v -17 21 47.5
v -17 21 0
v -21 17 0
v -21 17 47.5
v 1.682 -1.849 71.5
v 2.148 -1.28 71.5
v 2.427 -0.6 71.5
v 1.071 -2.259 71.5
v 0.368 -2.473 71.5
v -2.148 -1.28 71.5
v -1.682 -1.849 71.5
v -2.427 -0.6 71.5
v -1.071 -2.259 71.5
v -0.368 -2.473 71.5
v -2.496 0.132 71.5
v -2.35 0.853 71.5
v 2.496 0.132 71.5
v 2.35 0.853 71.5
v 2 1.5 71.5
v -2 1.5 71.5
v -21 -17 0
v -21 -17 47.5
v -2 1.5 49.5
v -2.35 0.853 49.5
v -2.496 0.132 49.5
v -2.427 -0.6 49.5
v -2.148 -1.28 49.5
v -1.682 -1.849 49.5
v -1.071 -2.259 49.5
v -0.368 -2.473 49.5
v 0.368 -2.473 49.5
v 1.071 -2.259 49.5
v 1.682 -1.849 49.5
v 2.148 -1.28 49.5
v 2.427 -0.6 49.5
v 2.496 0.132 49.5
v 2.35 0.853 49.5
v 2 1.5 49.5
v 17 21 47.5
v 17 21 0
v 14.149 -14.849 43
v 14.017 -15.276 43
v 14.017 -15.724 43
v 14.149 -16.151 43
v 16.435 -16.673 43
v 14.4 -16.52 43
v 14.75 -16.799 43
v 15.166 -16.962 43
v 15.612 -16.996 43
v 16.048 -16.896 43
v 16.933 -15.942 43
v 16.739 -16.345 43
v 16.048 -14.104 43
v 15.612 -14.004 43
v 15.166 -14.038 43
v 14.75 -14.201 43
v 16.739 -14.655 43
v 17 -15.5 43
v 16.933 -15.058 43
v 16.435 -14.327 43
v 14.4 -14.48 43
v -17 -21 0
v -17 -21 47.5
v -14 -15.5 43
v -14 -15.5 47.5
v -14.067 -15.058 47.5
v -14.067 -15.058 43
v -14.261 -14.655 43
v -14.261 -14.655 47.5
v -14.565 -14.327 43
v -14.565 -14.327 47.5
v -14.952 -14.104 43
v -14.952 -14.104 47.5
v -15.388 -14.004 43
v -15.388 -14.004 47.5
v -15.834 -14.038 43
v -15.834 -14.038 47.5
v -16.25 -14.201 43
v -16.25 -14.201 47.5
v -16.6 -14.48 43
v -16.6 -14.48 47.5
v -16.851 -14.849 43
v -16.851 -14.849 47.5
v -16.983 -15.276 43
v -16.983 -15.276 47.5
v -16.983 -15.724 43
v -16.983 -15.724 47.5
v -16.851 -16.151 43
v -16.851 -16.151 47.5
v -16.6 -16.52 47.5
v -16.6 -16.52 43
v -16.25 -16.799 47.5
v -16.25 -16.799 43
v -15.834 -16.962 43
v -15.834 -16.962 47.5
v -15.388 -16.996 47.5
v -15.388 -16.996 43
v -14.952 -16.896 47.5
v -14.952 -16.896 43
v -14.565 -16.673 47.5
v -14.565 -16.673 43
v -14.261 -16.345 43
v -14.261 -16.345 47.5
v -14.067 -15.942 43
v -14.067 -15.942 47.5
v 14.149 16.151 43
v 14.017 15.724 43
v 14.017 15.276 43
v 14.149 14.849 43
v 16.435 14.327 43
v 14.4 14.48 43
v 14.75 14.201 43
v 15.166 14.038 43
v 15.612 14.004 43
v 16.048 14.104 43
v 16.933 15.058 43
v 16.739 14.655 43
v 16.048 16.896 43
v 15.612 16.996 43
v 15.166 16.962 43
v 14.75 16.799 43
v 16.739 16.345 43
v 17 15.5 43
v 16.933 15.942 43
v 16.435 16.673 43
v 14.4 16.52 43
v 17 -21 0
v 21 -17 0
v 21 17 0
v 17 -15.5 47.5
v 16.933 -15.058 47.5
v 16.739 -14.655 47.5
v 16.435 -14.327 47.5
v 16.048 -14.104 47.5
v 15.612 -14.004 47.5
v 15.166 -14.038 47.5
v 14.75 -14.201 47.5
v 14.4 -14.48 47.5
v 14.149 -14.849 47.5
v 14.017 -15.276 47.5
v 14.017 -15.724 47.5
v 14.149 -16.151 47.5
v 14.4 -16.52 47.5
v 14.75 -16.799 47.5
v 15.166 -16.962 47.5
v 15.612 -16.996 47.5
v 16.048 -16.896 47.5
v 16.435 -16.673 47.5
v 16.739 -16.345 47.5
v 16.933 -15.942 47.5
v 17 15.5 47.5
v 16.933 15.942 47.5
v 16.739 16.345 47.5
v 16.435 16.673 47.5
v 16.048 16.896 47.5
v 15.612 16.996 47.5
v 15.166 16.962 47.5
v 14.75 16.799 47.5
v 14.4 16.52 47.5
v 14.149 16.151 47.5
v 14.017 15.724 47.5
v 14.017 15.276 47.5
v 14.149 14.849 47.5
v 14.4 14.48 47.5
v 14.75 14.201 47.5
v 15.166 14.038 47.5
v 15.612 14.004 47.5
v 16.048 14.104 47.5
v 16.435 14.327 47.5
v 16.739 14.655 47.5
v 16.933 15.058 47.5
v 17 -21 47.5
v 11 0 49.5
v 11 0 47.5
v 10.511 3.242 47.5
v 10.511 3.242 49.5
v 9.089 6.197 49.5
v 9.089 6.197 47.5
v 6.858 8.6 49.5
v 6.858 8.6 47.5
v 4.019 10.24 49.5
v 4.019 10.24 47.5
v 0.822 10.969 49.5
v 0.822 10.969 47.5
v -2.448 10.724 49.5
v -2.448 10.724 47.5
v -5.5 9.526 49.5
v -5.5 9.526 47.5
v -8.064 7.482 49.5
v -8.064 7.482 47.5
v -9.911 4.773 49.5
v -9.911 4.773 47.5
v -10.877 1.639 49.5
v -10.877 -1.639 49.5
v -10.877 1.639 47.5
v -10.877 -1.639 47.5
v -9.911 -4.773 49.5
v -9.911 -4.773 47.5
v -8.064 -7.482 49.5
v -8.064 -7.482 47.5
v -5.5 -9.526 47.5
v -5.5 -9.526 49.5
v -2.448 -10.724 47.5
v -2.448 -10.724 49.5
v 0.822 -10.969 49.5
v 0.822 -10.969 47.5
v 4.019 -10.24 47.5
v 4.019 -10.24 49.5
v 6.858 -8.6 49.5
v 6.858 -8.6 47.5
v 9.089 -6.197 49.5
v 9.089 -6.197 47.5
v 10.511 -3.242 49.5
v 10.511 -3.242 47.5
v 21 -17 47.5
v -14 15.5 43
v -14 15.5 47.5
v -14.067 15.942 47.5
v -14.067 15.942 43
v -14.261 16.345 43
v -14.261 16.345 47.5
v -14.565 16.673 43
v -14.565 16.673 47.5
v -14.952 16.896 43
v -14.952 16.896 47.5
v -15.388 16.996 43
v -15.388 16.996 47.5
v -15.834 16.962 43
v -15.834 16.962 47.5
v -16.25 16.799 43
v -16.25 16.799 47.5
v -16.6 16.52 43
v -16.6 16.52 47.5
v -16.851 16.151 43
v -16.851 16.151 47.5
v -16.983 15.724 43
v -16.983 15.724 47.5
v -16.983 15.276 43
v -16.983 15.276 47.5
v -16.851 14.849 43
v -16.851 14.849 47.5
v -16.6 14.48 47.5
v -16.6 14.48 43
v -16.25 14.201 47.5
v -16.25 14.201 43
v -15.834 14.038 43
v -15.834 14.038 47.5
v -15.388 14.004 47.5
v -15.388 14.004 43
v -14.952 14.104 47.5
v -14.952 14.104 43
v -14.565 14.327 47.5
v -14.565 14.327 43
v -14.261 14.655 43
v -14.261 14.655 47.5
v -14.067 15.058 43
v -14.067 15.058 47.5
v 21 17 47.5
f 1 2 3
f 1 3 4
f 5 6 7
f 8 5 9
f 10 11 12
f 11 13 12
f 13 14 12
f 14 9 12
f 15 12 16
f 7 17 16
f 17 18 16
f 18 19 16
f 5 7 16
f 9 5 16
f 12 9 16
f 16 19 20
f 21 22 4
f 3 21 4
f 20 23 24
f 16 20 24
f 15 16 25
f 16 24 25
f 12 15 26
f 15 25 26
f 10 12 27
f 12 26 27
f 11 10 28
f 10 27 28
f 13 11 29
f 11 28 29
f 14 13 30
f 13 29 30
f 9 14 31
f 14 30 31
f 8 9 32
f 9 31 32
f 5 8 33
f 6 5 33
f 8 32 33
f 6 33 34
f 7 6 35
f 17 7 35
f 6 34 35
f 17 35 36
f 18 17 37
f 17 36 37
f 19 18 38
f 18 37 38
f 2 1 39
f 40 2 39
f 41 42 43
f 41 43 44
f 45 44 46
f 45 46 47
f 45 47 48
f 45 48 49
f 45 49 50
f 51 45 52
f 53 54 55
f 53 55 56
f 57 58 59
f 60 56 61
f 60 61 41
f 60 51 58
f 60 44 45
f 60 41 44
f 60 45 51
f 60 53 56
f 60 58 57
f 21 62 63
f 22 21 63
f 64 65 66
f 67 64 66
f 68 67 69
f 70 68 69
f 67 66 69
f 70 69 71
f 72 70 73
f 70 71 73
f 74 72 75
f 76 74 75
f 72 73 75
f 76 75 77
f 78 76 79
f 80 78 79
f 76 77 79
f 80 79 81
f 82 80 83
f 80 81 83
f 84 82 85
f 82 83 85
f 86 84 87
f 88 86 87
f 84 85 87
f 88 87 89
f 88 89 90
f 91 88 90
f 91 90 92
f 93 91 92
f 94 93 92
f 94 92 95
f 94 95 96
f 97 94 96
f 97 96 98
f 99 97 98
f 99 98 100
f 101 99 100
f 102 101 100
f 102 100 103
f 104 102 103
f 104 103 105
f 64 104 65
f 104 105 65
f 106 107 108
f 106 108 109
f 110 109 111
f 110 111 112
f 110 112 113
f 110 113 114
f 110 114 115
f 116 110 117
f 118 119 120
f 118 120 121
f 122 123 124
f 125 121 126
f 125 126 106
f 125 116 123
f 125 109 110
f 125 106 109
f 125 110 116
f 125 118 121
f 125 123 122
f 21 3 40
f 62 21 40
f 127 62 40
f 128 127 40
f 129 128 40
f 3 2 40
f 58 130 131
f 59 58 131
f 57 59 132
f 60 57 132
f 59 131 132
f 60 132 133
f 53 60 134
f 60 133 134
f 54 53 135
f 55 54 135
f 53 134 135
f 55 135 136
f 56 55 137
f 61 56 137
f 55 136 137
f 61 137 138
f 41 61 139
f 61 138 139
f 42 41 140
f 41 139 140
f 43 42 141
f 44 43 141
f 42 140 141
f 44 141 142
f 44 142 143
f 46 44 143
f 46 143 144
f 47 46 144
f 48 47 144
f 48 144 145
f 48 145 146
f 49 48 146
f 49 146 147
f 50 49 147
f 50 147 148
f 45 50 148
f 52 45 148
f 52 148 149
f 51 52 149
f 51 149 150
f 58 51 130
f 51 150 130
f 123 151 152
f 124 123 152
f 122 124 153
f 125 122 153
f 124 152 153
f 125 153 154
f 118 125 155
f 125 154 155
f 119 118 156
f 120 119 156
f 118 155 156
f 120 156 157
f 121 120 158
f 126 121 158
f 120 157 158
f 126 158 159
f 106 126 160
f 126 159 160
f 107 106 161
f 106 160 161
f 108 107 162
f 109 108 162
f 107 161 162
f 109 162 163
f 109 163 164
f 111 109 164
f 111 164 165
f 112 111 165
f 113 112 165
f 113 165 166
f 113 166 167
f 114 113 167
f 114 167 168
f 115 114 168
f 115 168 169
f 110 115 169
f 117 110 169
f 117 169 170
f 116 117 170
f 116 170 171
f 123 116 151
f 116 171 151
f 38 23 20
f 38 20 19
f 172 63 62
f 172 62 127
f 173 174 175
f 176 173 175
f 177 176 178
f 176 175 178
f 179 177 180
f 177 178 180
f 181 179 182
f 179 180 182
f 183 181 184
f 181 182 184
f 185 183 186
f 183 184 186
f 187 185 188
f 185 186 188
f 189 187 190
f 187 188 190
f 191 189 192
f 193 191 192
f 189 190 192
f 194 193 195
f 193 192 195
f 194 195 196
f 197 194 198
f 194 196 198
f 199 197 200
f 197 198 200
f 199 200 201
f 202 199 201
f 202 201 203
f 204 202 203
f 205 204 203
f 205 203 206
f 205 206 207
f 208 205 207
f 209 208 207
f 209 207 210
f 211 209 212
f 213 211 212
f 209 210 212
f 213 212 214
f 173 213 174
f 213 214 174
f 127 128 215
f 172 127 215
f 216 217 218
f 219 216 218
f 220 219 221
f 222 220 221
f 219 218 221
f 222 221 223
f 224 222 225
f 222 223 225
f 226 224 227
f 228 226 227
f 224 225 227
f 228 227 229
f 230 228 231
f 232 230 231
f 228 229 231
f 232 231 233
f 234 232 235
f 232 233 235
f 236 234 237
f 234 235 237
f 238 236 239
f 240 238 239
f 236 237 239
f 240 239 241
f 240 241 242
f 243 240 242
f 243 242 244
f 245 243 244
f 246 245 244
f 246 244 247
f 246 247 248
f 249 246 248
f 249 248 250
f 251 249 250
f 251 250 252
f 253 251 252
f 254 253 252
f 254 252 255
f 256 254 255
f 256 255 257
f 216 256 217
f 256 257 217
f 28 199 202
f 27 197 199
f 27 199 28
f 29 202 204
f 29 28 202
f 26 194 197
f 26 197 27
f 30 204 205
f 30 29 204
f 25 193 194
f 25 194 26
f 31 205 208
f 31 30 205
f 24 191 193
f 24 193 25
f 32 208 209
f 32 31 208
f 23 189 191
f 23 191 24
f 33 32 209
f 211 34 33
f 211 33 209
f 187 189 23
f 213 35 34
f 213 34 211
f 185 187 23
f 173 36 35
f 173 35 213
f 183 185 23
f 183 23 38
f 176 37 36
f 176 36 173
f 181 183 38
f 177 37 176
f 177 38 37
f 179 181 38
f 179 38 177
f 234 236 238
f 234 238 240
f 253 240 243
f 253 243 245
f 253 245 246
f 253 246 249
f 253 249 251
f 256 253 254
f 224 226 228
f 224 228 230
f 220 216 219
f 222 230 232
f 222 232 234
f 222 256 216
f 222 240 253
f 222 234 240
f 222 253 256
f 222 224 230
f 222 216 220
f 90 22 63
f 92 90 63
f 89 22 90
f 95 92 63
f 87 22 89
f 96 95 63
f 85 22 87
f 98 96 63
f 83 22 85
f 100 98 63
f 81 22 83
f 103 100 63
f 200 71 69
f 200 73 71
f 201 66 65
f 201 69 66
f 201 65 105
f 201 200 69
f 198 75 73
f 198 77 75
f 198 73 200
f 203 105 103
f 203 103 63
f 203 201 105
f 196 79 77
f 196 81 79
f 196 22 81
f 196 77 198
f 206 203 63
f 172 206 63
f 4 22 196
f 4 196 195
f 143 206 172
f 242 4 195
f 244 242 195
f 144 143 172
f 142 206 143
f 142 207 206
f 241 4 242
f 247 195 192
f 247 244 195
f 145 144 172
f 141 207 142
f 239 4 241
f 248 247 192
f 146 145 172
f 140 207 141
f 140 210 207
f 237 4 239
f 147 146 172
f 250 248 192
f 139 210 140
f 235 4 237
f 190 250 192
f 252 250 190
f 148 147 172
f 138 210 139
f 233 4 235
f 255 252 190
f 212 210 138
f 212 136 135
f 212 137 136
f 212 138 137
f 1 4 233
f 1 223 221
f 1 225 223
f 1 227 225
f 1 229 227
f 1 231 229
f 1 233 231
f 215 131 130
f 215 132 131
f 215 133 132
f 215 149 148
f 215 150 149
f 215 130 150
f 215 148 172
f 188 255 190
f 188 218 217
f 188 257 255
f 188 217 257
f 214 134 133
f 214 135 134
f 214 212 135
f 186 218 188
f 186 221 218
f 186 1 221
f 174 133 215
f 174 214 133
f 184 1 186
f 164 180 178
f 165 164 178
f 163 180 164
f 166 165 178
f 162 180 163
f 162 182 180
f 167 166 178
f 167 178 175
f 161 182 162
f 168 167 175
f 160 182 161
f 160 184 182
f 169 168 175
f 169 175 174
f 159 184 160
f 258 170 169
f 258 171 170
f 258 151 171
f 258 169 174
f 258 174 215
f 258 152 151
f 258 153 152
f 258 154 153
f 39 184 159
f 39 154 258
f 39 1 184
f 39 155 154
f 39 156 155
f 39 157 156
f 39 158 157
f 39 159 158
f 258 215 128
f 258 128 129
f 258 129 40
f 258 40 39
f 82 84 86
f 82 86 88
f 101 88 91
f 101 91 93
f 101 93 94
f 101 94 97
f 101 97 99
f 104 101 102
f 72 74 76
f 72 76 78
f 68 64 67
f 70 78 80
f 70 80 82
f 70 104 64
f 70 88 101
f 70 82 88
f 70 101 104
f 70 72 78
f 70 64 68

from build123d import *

# Parameters (mm, degrees)
SKETCH_W     = 42
SKETCH_H     = 42
PAD_DEPTH    = 47.5
SKETCH001_R  = 1.5
POCKET_DEPTH = 4.5
SKETCH002_R  = 11
PAD001_DEPTH = 2
PAD002_DEPTH = 22
CHAMFER_SIZE = 4


with BuildPart() as part:
    # Sketch → Pad (new body)
    with BuildSketch(Plane.XY):
        Rectangle(SKETCH_W, SKETCH_H)
    extrude(amount=PAD_DEPTH)

    # Sketch001 → Pocket (cut)
    with BuildSketch(Plane.XY.offset(47.5)):
        with Locations((-15.5, 15.5)):
            Circle(SKETCH001_R)
        with Locations((15.5, 15.5)):
            Circle(SKETCH001_R)
        with Locations((-15.5, -15.5)):
            Circle(SKETCH001_R)
        with Locations((15.5, -15.5)):
            Circle(SKETCH001_R)
    extrude(amount=-POCKET_DEPTH, mode=Mode.SUBTRACT)

    # Sketch002 → Pad001 (new body)
    with BuildSketch(Plane.XY.offset(47.5)):
        Circle(SKETCH002_R)
    extrude(amount=PAD001_DEPTH)

    # Sketch003 → Pad002 (new body)
    with BuildSketch(Plane.XY.offset(49.5)):
        with BuildLine():
            Line((-2, 1.5), (2, 1.5))
            ThreePointArc((-2, 1.5), (0, -2.5), (2, 1.5))
        make_face()
    extrude(amount=PAD002_DEPTH)

    # Chamfer
    chamfer_edges = [part.edges().sort_by_distance(p)[0] for p in [
        (-21, -21, 23.75),
        (21, -21, 23.75),
        (21, 21, 23.75),
        (-21, 21, 23.75),
    ]]
    chamfer(chamfer_edges, length=CHAMFER_SIZE)


solid = part.part
